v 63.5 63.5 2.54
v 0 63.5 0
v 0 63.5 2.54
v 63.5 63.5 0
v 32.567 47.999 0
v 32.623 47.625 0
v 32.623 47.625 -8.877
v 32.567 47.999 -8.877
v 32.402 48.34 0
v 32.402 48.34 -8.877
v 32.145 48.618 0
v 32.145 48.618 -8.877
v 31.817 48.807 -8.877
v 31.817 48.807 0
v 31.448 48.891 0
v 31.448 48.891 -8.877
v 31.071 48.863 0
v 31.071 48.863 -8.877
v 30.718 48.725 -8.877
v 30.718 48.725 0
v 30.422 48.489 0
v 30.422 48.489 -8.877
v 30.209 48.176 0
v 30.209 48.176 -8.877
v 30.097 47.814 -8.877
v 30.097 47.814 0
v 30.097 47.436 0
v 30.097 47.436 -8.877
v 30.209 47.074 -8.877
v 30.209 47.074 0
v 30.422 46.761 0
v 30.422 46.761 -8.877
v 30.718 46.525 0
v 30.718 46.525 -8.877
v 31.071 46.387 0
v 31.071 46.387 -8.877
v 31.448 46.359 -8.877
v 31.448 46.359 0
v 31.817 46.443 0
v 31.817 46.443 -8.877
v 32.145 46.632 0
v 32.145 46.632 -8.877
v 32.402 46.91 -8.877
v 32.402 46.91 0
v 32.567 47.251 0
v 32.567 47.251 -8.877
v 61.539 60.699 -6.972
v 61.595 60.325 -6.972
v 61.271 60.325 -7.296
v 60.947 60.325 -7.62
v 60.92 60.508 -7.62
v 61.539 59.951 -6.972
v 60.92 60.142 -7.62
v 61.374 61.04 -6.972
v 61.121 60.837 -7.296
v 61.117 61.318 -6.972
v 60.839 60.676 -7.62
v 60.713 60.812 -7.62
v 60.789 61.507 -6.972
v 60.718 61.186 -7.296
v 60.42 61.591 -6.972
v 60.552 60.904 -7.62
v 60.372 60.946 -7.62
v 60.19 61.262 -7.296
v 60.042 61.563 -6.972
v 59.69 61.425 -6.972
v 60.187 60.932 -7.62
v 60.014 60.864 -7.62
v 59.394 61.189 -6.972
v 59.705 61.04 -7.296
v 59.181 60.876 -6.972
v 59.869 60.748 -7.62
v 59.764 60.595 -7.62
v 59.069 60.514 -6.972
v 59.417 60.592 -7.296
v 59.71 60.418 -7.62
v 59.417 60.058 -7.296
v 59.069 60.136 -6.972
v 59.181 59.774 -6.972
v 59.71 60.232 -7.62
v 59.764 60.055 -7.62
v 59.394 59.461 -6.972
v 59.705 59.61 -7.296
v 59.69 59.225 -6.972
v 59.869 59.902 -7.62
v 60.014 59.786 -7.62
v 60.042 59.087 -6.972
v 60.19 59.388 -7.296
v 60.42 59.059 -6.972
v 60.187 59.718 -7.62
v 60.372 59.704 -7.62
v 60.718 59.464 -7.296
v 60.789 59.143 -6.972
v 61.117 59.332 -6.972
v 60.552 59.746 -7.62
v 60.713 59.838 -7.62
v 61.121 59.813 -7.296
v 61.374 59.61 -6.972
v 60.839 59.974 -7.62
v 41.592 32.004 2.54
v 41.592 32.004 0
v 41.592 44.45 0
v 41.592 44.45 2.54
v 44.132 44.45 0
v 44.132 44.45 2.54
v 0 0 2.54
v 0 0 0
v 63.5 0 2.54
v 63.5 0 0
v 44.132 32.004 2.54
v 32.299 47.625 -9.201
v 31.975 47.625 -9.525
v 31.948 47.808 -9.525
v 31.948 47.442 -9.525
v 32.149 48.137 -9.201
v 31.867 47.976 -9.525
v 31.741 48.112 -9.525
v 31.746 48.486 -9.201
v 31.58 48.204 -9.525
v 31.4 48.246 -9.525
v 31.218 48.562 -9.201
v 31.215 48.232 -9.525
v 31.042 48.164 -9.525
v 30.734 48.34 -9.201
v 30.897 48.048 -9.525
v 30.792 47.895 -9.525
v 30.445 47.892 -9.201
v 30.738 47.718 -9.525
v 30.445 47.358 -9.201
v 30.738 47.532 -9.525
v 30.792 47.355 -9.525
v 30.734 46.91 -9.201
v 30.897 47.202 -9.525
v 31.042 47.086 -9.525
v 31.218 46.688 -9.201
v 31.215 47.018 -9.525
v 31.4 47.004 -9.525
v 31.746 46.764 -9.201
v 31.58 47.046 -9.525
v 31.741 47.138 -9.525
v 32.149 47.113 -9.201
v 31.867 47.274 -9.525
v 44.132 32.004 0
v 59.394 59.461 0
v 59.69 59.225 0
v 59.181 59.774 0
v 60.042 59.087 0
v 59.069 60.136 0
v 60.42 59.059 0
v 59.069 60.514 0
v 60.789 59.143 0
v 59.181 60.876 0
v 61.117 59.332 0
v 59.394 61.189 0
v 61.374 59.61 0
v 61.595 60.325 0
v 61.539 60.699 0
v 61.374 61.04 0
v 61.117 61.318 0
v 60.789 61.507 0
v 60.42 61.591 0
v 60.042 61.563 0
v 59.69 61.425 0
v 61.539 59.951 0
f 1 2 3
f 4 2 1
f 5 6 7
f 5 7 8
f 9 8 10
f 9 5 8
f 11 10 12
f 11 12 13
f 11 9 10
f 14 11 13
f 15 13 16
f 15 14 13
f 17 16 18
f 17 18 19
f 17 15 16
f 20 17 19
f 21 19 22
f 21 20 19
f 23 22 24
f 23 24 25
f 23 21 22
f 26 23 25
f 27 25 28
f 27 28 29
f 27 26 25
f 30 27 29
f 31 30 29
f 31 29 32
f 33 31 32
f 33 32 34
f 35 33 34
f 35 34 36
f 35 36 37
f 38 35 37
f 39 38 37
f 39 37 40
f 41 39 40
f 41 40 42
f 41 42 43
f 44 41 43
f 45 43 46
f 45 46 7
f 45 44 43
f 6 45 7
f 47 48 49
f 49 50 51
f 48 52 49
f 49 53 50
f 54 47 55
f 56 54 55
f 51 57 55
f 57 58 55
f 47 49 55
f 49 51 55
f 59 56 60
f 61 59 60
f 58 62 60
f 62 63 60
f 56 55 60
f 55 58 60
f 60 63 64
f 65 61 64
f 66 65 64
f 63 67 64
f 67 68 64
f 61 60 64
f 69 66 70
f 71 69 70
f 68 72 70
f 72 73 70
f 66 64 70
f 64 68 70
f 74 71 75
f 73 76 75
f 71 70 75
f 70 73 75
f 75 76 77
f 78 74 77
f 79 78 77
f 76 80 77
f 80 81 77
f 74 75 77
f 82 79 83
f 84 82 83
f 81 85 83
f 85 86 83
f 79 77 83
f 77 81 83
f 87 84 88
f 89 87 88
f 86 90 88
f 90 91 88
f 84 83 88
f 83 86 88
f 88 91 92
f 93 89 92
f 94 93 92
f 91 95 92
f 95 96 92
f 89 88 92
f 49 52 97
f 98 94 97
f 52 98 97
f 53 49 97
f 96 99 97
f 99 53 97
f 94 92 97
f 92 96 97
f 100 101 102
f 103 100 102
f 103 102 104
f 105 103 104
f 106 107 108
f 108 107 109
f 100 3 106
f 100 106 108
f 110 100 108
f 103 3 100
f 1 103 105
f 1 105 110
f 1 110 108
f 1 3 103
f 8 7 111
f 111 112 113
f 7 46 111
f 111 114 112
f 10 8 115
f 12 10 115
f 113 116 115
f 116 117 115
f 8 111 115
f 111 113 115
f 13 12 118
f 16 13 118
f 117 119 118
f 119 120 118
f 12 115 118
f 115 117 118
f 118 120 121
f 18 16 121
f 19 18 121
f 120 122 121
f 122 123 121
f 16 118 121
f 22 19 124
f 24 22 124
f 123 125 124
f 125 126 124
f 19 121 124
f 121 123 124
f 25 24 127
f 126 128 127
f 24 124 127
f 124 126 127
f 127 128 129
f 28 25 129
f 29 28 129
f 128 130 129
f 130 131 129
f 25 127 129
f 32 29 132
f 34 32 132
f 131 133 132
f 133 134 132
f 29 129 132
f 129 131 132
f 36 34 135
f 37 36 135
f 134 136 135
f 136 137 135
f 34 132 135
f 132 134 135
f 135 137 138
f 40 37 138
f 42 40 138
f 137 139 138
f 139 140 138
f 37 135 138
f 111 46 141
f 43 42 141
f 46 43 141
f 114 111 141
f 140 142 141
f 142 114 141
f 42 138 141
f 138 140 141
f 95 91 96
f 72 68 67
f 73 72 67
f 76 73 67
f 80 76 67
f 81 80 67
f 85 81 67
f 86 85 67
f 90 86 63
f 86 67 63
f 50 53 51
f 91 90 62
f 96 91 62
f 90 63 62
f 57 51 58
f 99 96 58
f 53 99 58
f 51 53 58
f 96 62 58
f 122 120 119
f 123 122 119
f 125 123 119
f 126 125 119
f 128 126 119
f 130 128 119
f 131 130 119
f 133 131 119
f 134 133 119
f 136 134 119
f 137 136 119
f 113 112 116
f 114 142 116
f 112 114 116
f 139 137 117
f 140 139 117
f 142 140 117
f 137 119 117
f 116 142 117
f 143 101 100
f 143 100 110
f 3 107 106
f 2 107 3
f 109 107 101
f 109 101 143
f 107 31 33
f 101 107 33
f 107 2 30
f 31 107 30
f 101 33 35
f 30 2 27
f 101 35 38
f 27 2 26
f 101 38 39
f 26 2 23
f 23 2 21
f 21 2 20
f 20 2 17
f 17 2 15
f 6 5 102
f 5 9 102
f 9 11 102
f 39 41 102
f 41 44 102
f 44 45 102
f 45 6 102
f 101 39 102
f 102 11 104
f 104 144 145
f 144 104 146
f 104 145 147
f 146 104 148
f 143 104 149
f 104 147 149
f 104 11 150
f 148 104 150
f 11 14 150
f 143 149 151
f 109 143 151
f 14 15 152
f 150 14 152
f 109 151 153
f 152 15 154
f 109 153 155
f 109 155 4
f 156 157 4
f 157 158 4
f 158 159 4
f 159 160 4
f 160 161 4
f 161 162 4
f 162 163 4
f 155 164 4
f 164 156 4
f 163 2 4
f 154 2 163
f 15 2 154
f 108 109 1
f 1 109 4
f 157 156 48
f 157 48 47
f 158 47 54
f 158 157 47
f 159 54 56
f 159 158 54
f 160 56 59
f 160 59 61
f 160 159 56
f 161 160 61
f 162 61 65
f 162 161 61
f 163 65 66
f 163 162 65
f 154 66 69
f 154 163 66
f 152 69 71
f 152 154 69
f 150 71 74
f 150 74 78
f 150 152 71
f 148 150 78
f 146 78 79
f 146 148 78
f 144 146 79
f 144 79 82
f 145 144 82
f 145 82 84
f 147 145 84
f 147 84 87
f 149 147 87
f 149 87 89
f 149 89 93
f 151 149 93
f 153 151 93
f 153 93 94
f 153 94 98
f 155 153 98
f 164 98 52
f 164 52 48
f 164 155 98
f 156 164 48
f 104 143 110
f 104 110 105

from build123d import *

# Parameters (mm, degrees)
F0_W          = 63.5
F0_H          = 63.5
F0_R          = 1.27
F0_W_2        = 2.54
F0_H_2        = 12.446
F1_DEPTH      = 2.54
F2_R          = 1.27
F3_DEPTH      = 2.54
F3_DEPTH_BACK = 7.62
F4_DEPTH      = 9.525
F5_SIZE       = 0.6477


with BuildPart() as f1:
    # F0 (on Top) → F1 (new body)
    with BuildSketch(Plane.XY):
        with Locations((31.75, 31.75)):
            Rectangle(F0_W, F0_H)
        with Locations((31.353125, 47.625)):
            Circle(F0_R, mode=Mode.SUBTRACT)
        with Locations((42.8625, 38.227)):
            Rectangle(F0_W_2, F0_H_2, mode=Mode.SUBTRACT)
        with Locations((60.325, 60.325)):
            Circle(F0_R, mode=Mode.SUBTRACT)
    extrude(amount=F1_DEPTH)

    # F2 (on Top) → F3 (join, two sides)
    with BuildSketch(Plane.XY) as f3_sk:
        with Locations((31.353125, 47.625)):
            Circle(F2_R)
        with Locations((60.325, 60.325)):
            Circle(F2_R)
    extrude(amount=F3_DEPTH)
    extrude(f3_sk.sketch, amount=-F3_DEPTH_BACK)

    # F2 (on Top) → F4 (join)
    with BuildSketch(Plane.XY):
        with Locations((31.353125, 47.625)):
            Circle(F2_R)
    extrude(amount=-F4_DEPTH)

    # F5
    f5_edges = [f1.edges().sort_by_distance(p)[0] for p in [
        (59.055, 60.325, -7.62),
        (30.083125, 47.625, -9.525),
    ]]
    chamfer(f5_edges, length=F5_SIZE)


solid = f1.part
